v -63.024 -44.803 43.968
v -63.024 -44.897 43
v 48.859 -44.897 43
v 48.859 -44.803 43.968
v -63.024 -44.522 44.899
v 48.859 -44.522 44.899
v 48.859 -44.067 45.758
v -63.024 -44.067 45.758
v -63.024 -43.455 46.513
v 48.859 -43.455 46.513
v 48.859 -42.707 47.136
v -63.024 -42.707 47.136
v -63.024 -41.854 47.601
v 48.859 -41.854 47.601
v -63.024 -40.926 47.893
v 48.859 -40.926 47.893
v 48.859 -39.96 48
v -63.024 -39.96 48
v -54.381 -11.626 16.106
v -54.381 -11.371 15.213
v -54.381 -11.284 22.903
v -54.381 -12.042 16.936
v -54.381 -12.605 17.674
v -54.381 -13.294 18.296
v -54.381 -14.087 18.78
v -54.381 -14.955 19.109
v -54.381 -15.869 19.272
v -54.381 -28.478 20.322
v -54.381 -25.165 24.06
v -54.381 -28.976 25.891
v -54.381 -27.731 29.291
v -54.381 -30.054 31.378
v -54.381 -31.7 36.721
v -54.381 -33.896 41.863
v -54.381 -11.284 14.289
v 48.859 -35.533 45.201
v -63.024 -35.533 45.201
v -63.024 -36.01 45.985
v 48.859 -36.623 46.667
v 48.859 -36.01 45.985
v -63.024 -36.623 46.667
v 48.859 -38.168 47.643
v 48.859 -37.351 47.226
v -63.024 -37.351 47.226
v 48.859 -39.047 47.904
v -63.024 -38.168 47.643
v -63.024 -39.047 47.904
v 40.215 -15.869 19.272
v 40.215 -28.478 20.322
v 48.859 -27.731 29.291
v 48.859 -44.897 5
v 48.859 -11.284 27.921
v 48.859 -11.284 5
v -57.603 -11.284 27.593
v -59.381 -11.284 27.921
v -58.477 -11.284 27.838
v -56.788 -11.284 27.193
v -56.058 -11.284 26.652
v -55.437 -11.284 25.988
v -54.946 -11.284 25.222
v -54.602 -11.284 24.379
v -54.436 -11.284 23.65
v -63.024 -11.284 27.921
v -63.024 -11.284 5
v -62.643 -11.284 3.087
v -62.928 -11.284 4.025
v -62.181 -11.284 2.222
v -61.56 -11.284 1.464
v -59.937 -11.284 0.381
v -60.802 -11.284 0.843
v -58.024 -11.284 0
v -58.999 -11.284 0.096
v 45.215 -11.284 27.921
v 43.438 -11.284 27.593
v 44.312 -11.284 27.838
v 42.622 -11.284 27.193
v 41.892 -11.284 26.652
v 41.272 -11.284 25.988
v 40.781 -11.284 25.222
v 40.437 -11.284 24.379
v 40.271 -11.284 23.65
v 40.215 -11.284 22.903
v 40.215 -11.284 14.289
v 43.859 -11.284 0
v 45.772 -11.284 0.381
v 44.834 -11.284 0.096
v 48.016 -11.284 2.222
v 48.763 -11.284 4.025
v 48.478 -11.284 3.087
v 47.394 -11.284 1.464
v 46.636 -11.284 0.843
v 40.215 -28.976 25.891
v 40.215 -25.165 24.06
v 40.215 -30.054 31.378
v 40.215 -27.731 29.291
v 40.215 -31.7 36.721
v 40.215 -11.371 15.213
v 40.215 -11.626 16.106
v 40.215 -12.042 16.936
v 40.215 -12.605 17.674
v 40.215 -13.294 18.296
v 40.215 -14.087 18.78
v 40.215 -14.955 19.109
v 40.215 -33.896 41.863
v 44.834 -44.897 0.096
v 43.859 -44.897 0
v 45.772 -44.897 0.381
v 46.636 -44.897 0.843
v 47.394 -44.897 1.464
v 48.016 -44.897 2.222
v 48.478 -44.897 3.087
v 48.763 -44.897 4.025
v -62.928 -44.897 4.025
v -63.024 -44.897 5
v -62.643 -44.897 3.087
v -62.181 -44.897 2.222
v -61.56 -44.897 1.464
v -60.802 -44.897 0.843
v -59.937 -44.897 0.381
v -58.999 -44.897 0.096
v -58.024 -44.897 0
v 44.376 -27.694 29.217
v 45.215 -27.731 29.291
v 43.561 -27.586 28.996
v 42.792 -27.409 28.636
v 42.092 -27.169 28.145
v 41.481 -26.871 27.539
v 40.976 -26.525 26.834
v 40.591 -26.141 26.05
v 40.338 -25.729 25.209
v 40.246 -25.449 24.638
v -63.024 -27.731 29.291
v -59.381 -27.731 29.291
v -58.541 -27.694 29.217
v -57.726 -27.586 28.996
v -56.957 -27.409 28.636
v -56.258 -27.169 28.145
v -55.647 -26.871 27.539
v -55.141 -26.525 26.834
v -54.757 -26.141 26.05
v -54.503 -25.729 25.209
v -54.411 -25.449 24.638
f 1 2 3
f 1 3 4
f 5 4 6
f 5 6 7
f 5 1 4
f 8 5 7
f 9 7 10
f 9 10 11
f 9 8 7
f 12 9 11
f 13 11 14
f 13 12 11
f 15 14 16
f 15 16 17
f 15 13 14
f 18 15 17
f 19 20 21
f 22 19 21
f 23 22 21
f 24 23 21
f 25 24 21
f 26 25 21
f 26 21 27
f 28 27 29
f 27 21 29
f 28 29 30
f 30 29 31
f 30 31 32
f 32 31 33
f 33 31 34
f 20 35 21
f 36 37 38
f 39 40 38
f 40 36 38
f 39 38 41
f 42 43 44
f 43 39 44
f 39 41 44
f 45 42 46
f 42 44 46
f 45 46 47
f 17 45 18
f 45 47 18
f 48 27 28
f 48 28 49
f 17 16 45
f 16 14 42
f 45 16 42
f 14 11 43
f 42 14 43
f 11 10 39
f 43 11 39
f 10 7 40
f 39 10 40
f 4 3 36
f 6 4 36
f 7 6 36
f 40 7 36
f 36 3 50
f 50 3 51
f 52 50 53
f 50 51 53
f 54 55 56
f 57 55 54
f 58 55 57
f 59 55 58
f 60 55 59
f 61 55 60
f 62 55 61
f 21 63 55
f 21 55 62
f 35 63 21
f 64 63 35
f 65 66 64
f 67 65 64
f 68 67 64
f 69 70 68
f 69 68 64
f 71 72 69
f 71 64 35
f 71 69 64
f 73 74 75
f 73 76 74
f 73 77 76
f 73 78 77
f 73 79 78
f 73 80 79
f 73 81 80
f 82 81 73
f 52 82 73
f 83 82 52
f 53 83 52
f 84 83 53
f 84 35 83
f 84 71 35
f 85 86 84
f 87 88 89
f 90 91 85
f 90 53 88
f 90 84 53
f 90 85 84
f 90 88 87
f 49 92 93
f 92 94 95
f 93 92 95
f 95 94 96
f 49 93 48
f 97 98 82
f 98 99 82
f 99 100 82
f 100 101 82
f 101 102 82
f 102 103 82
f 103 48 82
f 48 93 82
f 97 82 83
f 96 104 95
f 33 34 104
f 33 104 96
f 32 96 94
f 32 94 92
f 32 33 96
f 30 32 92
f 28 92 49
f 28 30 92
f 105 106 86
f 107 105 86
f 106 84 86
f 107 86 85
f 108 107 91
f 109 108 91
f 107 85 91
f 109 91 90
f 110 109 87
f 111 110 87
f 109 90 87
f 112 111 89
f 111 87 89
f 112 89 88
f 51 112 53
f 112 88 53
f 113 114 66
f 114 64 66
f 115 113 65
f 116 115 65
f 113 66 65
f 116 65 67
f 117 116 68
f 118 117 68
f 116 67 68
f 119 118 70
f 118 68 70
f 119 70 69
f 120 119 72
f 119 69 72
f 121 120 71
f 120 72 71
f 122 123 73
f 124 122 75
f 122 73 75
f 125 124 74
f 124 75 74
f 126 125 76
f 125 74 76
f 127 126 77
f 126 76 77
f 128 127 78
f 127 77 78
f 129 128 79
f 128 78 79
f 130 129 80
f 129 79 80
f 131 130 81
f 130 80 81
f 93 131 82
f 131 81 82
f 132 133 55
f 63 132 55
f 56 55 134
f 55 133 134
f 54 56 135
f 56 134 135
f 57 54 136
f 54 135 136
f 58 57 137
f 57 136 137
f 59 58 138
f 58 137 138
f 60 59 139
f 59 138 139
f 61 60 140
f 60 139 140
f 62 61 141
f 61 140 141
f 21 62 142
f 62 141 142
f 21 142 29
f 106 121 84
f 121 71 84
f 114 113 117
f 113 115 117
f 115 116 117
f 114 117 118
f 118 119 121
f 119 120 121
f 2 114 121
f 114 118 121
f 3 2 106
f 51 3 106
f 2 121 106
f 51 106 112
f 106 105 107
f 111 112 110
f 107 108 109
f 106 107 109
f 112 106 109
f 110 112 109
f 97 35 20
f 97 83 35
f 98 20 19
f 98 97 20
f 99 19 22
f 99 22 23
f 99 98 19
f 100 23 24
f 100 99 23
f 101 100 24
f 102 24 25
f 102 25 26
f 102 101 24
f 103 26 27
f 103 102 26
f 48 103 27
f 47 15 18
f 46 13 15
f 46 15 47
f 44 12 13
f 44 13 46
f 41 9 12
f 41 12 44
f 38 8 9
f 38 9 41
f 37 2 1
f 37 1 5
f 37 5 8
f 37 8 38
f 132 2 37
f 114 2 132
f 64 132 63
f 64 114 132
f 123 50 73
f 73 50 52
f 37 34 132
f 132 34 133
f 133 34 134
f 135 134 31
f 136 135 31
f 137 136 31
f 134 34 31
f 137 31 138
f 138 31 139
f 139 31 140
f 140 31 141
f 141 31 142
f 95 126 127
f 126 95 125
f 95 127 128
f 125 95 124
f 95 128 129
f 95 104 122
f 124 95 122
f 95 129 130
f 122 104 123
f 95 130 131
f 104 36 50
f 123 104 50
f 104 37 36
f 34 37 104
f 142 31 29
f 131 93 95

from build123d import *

# Parameters (mm, degrees)
F0_W         = 111.8826307356
F0_H         = 33.61280635
F1_DEPTH     = 48
F3_DEPTH     = 92
F5_DEPTH     = 9
F6_T1_DEPTH  = 94.5960432291
F7_R         = 5
F8_R         = 5
F9_R         = 5
F10_T1_DEPTH = 136.8826307356
F10_T3_DEPTH = 127.4671918099


# Not quite as in the source:
# - a fillet or chamfer that OpenCascade refuses, or shapes differently, is made with other operations: its cross-section is extruded or revolved along the edge and cut away or added


with BuildPart() as f1:
    # F0 (on Top) → F1 (new body)
    with BuildSketch(Plane.XY):
        with Locations((-7.0826988667, -28.0907023698)):
            Rectangle(F0_W, F0_H)
    extrude(amount=F1_DEPTH)

    # F2 (on Right) → F3 (cut, symmetric)
    with BuildSketch(Plane.YZ):
        Polygon((-2.2725867394, 56.280748791), (-39.9752296507, 54.2606711388), (-27.7305655181, 29.2911604047), (-4.6817823313, 27.3704268038), align=None)
    extrude(amount=F3_DEPTH, both=True, mode=Mode.SUBTRACT)

    # F4 (on face) → F5 (cut)
    with BuildSketch(Plane(origin=(0, 2.2328525009, 26.7942067339), x_dir=(1, 0, 0), z_dir=(0, 0.0830455515, 0.9965457523))):
        Polygon((40.2153246105, -5.8544473723), (-54.3807186186, -8.7455315515), (-54.3807186186, -30.0672778452), (40.2153246105, -30.0672778452), align=None)
    extrude(amount=-F5_DEPTH, mode=Mode.SUBTRACT)

    # F6: fillet of radius 53.3943165321 on 1 edges, made by hand

    # F6_s2 → F6_t1 (cut)
    with BuildSketch(Plane.YZ.offset(-54.3807186186)):
        with BuildLine():
            ThreePointArc((-33.8957137688, 41.863227205), (-30.0543394398, 31.3775725516), (-28.4779754817, 20.3222486342))
            Line((-28.4779754817, 20.3222486342), (-27.7305655181, 29.2911604047))
            Line((-27.7305655181, 29.2911604047), (-33.8957137688, 41.863227205))
        make_face()
    extrude(amount=F6_T1_DEPTH, mode=Mode.SUBTRACT)

    # F7
    f7_edges = [f1.edges().sort_by_distance(p)[0] for p in [
        (-54.380719, -19.507432, 28.605899),
        (40.215325, -19.507432, 28.605899),
    ]]
    fillet(f7_edges, radius=F7_R)

    # F8
    f8_edges = [f1.edges().sort_by_distance(p)[0] for p in [
        (-7.082697, -11.284299, 18.889441),
    ]]
    fillet(f8_edges, radius=F8_R)

    # F9
    f9_edges = [f1.edges().sort_by_distance(p)[0] for p in [
        (-63.024014, -28.090702, 0),
        (48.858617, -28.090702, 0),
    ]]
    fillet(f9_edges, radius=F9_R)

    # F10: fillet of radius 5 on 2 edges, made by hand

    # F10_s2 → F10_t1 (cut)
    with BuildSketch(Plane.YZ.offset(-75.5240142345)):
        with BuildLine():
            ThreePointArc((-44.8971055448, 43), (-43.4326394507, 46.5355339059), (-39.8971055448, 48))
            Line((-39.8971055448, 48), (-44.8971055448, 48))
            Line((-44.8971055448, 48), (-44.8971055448, 43))
        make_face()
    extrude(amount=F10_T1_DEPTH, mode=Mode.SUBTRACT)

    # F10_s4 → F10_t3 (cut)
    with BuildSketch(Plane.YZ.offset(-70.8162947717)):
        with BuildLine():
            ThreePointArc((-35.5327359736, 45.2014685051), (-37.3769475866, 47.2430733275), (-40.0220050033, 48))
            Line((-40.0220050033, 48), (-36.9050927884, 48))
            Line((-36.9050927884, 48), (-35.5327359736, 45.2014685051))
        make_face()
    extrude(amount=F10_T3_DEPTH, mode=Mode.SUBTRACT)


solid = f1.part
